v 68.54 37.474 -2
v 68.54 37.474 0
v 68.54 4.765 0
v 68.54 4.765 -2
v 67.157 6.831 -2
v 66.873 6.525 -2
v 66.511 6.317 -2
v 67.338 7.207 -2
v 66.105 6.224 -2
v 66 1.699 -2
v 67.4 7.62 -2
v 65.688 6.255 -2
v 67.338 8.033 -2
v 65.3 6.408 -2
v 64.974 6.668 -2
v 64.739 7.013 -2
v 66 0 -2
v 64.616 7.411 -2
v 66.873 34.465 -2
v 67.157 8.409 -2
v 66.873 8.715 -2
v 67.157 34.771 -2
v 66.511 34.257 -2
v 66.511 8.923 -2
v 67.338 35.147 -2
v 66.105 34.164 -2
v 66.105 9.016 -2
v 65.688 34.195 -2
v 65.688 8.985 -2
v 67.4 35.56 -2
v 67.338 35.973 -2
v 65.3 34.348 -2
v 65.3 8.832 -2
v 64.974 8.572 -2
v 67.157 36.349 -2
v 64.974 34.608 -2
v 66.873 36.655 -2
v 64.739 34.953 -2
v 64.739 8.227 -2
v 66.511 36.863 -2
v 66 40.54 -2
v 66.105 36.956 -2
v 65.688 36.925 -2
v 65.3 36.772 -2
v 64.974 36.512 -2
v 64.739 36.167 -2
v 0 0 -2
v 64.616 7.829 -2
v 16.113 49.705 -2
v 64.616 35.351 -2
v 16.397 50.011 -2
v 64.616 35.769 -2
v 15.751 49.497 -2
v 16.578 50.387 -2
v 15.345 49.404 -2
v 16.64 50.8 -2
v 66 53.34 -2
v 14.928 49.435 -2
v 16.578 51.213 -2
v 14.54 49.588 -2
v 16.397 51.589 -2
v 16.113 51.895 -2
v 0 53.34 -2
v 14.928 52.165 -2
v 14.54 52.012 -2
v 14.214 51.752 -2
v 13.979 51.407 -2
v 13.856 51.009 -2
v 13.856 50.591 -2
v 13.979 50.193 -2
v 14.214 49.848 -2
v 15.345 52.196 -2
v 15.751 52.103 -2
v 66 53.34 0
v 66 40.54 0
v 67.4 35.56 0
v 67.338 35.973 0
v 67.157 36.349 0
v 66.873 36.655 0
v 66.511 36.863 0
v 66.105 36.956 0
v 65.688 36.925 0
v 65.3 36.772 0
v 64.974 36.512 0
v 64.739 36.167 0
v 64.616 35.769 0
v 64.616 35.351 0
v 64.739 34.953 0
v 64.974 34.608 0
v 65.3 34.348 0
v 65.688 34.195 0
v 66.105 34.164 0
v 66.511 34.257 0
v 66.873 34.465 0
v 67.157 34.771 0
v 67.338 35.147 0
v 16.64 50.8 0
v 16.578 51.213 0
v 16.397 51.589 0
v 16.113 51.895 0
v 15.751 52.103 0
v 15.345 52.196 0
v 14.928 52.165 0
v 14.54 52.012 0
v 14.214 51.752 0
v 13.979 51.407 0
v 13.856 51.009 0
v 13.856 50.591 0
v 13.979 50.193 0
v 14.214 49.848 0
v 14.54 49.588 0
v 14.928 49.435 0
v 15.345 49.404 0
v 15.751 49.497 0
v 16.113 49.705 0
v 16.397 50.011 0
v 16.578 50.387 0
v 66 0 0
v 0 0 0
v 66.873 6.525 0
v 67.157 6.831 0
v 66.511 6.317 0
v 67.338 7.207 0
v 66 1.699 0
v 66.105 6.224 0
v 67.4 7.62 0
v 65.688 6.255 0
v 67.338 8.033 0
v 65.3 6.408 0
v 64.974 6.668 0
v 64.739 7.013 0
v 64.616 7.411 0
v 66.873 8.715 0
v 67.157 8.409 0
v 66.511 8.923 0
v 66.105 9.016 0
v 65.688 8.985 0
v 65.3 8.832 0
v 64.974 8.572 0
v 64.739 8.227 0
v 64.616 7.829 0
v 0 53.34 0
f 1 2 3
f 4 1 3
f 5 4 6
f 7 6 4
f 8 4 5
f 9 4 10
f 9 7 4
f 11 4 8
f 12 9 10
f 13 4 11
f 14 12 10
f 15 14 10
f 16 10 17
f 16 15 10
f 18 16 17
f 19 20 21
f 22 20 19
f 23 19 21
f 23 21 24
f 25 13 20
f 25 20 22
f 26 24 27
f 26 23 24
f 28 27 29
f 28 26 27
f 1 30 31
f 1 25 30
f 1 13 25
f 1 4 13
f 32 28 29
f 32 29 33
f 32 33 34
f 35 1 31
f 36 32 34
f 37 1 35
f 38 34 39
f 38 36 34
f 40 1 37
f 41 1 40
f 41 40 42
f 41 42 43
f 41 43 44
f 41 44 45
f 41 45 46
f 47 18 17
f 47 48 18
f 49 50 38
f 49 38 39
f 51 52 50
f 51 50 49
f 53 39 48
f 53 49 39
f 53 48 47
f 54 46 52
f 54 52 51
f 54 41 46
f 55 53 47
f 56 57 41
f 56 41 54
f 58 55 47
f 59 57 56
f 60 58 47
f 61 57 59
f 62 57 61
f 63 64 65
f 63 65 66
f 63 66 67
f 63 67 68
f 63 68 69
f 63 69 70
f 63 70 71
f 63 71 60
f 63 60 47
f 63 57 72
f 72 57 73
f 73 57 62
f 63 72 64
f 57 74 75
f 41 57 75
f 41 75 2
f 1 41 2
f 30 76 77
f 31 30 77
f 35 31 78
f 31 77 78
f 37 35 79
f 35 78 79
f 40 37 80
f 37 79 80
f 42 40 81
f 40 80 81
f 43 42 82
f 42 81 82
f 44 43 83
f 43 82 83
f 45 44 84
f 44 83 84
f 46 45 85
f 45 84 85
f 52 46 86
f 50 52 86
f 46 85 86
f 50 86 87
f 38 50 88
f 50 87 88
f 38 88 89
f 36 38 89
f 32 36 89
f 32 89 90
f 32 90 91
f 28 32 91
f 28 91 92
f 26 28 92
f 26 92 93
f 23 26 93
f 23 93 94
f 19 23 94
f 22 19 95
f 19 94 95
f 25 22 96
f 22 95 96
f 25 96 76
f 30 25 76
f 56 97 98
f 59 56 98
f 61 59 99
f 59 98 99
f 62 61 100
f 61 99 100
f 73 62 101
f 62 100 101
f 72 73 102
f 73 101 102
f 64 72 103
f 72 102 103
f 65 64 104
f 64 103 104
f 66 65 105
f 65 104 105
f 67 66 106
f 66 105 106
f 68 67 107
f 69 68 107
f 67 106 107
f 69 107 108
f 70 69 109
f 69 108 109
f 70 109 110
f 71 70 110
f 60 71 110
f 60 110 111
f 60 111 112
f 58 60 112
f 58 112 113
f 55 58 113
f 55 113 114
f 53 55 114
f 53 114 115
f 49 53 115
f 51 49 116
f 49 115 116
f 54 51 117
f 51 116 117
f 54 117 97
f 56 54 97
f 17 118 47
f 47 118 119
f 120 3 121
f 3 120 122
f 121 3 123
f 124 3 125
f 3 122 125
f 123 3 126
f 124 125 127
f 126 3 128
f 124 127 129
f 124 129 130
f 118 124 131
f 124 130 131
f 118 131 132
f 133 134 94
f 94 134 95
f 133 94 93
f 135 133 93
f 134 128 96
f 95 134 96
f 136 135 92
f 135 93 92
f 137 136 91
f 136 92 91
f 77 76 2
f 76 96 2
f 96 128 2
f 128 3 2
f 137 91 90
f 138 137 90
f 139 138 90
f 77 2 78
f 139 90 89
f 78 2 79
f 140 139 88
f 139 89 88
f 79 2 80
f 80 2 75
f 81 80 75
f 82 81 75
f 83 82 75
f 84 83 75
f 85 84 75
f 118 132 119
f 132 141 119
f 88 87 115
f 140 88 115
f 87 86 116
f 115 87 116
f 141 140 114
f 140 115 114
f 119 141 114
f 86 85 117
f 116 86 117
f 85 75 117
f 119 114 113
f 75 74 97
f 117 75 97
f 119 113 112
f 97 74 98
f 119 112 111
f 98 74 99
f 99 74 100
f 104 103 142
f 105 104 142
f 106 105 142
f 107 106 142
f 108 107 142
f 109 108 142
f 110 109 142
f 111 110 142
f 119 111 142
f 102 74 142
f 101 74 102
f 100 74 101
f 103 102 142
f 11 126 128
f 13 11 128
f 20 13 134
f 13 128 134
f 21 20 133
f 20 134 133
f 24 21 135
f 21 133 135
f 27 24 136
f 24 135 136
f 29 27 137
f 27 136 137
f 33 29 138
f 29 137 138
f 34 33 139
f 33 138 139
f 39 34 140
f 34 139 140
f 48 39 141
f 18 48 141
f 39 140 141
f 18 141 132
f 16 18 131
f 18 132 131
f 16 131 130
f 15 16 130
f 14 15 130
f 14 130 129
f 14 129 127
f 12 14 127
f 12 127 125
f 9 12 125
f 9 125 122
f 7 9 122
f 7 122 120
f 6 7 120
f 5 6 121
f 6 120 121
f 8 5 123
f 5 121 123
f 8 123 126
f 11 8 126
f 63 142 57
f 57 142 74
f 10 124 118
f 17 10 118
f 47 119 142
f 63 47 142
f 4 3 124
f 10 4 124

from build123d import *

# Parameters (mm, degrees)
SKETCH2_R           = 1.4
BOSS_EXTRUDE1_DEPTH = 2


with BuildPart() as part:
    # Sketch2 → Boss-Extrude1 (new body)
    with BuildSketch(Plane.XY):
        Polygon((0, 0), (0, 53.34), (66, 53.34), (66, 40.54), (68.54, 37.473610341), (68.54, 4.765453974), (66, 1.699064314), (66, 0), align=None)
        with Locations((15.24, 50.8)):
            Circle(SKETCH2_R, mode=Mode.SUBTRACT)
        with Locations((66, 35.56)):
            Circle(SKETCH2_R, mode=Mode.SUBTRACT)
        with Locations((66, 7.62)):
            Circle(SKETCH2_R, mode=Mode.SUBTRACT)
    extrude(amount=-BOSS_EXTRUDE1_DEPTH)


solid = part.part
